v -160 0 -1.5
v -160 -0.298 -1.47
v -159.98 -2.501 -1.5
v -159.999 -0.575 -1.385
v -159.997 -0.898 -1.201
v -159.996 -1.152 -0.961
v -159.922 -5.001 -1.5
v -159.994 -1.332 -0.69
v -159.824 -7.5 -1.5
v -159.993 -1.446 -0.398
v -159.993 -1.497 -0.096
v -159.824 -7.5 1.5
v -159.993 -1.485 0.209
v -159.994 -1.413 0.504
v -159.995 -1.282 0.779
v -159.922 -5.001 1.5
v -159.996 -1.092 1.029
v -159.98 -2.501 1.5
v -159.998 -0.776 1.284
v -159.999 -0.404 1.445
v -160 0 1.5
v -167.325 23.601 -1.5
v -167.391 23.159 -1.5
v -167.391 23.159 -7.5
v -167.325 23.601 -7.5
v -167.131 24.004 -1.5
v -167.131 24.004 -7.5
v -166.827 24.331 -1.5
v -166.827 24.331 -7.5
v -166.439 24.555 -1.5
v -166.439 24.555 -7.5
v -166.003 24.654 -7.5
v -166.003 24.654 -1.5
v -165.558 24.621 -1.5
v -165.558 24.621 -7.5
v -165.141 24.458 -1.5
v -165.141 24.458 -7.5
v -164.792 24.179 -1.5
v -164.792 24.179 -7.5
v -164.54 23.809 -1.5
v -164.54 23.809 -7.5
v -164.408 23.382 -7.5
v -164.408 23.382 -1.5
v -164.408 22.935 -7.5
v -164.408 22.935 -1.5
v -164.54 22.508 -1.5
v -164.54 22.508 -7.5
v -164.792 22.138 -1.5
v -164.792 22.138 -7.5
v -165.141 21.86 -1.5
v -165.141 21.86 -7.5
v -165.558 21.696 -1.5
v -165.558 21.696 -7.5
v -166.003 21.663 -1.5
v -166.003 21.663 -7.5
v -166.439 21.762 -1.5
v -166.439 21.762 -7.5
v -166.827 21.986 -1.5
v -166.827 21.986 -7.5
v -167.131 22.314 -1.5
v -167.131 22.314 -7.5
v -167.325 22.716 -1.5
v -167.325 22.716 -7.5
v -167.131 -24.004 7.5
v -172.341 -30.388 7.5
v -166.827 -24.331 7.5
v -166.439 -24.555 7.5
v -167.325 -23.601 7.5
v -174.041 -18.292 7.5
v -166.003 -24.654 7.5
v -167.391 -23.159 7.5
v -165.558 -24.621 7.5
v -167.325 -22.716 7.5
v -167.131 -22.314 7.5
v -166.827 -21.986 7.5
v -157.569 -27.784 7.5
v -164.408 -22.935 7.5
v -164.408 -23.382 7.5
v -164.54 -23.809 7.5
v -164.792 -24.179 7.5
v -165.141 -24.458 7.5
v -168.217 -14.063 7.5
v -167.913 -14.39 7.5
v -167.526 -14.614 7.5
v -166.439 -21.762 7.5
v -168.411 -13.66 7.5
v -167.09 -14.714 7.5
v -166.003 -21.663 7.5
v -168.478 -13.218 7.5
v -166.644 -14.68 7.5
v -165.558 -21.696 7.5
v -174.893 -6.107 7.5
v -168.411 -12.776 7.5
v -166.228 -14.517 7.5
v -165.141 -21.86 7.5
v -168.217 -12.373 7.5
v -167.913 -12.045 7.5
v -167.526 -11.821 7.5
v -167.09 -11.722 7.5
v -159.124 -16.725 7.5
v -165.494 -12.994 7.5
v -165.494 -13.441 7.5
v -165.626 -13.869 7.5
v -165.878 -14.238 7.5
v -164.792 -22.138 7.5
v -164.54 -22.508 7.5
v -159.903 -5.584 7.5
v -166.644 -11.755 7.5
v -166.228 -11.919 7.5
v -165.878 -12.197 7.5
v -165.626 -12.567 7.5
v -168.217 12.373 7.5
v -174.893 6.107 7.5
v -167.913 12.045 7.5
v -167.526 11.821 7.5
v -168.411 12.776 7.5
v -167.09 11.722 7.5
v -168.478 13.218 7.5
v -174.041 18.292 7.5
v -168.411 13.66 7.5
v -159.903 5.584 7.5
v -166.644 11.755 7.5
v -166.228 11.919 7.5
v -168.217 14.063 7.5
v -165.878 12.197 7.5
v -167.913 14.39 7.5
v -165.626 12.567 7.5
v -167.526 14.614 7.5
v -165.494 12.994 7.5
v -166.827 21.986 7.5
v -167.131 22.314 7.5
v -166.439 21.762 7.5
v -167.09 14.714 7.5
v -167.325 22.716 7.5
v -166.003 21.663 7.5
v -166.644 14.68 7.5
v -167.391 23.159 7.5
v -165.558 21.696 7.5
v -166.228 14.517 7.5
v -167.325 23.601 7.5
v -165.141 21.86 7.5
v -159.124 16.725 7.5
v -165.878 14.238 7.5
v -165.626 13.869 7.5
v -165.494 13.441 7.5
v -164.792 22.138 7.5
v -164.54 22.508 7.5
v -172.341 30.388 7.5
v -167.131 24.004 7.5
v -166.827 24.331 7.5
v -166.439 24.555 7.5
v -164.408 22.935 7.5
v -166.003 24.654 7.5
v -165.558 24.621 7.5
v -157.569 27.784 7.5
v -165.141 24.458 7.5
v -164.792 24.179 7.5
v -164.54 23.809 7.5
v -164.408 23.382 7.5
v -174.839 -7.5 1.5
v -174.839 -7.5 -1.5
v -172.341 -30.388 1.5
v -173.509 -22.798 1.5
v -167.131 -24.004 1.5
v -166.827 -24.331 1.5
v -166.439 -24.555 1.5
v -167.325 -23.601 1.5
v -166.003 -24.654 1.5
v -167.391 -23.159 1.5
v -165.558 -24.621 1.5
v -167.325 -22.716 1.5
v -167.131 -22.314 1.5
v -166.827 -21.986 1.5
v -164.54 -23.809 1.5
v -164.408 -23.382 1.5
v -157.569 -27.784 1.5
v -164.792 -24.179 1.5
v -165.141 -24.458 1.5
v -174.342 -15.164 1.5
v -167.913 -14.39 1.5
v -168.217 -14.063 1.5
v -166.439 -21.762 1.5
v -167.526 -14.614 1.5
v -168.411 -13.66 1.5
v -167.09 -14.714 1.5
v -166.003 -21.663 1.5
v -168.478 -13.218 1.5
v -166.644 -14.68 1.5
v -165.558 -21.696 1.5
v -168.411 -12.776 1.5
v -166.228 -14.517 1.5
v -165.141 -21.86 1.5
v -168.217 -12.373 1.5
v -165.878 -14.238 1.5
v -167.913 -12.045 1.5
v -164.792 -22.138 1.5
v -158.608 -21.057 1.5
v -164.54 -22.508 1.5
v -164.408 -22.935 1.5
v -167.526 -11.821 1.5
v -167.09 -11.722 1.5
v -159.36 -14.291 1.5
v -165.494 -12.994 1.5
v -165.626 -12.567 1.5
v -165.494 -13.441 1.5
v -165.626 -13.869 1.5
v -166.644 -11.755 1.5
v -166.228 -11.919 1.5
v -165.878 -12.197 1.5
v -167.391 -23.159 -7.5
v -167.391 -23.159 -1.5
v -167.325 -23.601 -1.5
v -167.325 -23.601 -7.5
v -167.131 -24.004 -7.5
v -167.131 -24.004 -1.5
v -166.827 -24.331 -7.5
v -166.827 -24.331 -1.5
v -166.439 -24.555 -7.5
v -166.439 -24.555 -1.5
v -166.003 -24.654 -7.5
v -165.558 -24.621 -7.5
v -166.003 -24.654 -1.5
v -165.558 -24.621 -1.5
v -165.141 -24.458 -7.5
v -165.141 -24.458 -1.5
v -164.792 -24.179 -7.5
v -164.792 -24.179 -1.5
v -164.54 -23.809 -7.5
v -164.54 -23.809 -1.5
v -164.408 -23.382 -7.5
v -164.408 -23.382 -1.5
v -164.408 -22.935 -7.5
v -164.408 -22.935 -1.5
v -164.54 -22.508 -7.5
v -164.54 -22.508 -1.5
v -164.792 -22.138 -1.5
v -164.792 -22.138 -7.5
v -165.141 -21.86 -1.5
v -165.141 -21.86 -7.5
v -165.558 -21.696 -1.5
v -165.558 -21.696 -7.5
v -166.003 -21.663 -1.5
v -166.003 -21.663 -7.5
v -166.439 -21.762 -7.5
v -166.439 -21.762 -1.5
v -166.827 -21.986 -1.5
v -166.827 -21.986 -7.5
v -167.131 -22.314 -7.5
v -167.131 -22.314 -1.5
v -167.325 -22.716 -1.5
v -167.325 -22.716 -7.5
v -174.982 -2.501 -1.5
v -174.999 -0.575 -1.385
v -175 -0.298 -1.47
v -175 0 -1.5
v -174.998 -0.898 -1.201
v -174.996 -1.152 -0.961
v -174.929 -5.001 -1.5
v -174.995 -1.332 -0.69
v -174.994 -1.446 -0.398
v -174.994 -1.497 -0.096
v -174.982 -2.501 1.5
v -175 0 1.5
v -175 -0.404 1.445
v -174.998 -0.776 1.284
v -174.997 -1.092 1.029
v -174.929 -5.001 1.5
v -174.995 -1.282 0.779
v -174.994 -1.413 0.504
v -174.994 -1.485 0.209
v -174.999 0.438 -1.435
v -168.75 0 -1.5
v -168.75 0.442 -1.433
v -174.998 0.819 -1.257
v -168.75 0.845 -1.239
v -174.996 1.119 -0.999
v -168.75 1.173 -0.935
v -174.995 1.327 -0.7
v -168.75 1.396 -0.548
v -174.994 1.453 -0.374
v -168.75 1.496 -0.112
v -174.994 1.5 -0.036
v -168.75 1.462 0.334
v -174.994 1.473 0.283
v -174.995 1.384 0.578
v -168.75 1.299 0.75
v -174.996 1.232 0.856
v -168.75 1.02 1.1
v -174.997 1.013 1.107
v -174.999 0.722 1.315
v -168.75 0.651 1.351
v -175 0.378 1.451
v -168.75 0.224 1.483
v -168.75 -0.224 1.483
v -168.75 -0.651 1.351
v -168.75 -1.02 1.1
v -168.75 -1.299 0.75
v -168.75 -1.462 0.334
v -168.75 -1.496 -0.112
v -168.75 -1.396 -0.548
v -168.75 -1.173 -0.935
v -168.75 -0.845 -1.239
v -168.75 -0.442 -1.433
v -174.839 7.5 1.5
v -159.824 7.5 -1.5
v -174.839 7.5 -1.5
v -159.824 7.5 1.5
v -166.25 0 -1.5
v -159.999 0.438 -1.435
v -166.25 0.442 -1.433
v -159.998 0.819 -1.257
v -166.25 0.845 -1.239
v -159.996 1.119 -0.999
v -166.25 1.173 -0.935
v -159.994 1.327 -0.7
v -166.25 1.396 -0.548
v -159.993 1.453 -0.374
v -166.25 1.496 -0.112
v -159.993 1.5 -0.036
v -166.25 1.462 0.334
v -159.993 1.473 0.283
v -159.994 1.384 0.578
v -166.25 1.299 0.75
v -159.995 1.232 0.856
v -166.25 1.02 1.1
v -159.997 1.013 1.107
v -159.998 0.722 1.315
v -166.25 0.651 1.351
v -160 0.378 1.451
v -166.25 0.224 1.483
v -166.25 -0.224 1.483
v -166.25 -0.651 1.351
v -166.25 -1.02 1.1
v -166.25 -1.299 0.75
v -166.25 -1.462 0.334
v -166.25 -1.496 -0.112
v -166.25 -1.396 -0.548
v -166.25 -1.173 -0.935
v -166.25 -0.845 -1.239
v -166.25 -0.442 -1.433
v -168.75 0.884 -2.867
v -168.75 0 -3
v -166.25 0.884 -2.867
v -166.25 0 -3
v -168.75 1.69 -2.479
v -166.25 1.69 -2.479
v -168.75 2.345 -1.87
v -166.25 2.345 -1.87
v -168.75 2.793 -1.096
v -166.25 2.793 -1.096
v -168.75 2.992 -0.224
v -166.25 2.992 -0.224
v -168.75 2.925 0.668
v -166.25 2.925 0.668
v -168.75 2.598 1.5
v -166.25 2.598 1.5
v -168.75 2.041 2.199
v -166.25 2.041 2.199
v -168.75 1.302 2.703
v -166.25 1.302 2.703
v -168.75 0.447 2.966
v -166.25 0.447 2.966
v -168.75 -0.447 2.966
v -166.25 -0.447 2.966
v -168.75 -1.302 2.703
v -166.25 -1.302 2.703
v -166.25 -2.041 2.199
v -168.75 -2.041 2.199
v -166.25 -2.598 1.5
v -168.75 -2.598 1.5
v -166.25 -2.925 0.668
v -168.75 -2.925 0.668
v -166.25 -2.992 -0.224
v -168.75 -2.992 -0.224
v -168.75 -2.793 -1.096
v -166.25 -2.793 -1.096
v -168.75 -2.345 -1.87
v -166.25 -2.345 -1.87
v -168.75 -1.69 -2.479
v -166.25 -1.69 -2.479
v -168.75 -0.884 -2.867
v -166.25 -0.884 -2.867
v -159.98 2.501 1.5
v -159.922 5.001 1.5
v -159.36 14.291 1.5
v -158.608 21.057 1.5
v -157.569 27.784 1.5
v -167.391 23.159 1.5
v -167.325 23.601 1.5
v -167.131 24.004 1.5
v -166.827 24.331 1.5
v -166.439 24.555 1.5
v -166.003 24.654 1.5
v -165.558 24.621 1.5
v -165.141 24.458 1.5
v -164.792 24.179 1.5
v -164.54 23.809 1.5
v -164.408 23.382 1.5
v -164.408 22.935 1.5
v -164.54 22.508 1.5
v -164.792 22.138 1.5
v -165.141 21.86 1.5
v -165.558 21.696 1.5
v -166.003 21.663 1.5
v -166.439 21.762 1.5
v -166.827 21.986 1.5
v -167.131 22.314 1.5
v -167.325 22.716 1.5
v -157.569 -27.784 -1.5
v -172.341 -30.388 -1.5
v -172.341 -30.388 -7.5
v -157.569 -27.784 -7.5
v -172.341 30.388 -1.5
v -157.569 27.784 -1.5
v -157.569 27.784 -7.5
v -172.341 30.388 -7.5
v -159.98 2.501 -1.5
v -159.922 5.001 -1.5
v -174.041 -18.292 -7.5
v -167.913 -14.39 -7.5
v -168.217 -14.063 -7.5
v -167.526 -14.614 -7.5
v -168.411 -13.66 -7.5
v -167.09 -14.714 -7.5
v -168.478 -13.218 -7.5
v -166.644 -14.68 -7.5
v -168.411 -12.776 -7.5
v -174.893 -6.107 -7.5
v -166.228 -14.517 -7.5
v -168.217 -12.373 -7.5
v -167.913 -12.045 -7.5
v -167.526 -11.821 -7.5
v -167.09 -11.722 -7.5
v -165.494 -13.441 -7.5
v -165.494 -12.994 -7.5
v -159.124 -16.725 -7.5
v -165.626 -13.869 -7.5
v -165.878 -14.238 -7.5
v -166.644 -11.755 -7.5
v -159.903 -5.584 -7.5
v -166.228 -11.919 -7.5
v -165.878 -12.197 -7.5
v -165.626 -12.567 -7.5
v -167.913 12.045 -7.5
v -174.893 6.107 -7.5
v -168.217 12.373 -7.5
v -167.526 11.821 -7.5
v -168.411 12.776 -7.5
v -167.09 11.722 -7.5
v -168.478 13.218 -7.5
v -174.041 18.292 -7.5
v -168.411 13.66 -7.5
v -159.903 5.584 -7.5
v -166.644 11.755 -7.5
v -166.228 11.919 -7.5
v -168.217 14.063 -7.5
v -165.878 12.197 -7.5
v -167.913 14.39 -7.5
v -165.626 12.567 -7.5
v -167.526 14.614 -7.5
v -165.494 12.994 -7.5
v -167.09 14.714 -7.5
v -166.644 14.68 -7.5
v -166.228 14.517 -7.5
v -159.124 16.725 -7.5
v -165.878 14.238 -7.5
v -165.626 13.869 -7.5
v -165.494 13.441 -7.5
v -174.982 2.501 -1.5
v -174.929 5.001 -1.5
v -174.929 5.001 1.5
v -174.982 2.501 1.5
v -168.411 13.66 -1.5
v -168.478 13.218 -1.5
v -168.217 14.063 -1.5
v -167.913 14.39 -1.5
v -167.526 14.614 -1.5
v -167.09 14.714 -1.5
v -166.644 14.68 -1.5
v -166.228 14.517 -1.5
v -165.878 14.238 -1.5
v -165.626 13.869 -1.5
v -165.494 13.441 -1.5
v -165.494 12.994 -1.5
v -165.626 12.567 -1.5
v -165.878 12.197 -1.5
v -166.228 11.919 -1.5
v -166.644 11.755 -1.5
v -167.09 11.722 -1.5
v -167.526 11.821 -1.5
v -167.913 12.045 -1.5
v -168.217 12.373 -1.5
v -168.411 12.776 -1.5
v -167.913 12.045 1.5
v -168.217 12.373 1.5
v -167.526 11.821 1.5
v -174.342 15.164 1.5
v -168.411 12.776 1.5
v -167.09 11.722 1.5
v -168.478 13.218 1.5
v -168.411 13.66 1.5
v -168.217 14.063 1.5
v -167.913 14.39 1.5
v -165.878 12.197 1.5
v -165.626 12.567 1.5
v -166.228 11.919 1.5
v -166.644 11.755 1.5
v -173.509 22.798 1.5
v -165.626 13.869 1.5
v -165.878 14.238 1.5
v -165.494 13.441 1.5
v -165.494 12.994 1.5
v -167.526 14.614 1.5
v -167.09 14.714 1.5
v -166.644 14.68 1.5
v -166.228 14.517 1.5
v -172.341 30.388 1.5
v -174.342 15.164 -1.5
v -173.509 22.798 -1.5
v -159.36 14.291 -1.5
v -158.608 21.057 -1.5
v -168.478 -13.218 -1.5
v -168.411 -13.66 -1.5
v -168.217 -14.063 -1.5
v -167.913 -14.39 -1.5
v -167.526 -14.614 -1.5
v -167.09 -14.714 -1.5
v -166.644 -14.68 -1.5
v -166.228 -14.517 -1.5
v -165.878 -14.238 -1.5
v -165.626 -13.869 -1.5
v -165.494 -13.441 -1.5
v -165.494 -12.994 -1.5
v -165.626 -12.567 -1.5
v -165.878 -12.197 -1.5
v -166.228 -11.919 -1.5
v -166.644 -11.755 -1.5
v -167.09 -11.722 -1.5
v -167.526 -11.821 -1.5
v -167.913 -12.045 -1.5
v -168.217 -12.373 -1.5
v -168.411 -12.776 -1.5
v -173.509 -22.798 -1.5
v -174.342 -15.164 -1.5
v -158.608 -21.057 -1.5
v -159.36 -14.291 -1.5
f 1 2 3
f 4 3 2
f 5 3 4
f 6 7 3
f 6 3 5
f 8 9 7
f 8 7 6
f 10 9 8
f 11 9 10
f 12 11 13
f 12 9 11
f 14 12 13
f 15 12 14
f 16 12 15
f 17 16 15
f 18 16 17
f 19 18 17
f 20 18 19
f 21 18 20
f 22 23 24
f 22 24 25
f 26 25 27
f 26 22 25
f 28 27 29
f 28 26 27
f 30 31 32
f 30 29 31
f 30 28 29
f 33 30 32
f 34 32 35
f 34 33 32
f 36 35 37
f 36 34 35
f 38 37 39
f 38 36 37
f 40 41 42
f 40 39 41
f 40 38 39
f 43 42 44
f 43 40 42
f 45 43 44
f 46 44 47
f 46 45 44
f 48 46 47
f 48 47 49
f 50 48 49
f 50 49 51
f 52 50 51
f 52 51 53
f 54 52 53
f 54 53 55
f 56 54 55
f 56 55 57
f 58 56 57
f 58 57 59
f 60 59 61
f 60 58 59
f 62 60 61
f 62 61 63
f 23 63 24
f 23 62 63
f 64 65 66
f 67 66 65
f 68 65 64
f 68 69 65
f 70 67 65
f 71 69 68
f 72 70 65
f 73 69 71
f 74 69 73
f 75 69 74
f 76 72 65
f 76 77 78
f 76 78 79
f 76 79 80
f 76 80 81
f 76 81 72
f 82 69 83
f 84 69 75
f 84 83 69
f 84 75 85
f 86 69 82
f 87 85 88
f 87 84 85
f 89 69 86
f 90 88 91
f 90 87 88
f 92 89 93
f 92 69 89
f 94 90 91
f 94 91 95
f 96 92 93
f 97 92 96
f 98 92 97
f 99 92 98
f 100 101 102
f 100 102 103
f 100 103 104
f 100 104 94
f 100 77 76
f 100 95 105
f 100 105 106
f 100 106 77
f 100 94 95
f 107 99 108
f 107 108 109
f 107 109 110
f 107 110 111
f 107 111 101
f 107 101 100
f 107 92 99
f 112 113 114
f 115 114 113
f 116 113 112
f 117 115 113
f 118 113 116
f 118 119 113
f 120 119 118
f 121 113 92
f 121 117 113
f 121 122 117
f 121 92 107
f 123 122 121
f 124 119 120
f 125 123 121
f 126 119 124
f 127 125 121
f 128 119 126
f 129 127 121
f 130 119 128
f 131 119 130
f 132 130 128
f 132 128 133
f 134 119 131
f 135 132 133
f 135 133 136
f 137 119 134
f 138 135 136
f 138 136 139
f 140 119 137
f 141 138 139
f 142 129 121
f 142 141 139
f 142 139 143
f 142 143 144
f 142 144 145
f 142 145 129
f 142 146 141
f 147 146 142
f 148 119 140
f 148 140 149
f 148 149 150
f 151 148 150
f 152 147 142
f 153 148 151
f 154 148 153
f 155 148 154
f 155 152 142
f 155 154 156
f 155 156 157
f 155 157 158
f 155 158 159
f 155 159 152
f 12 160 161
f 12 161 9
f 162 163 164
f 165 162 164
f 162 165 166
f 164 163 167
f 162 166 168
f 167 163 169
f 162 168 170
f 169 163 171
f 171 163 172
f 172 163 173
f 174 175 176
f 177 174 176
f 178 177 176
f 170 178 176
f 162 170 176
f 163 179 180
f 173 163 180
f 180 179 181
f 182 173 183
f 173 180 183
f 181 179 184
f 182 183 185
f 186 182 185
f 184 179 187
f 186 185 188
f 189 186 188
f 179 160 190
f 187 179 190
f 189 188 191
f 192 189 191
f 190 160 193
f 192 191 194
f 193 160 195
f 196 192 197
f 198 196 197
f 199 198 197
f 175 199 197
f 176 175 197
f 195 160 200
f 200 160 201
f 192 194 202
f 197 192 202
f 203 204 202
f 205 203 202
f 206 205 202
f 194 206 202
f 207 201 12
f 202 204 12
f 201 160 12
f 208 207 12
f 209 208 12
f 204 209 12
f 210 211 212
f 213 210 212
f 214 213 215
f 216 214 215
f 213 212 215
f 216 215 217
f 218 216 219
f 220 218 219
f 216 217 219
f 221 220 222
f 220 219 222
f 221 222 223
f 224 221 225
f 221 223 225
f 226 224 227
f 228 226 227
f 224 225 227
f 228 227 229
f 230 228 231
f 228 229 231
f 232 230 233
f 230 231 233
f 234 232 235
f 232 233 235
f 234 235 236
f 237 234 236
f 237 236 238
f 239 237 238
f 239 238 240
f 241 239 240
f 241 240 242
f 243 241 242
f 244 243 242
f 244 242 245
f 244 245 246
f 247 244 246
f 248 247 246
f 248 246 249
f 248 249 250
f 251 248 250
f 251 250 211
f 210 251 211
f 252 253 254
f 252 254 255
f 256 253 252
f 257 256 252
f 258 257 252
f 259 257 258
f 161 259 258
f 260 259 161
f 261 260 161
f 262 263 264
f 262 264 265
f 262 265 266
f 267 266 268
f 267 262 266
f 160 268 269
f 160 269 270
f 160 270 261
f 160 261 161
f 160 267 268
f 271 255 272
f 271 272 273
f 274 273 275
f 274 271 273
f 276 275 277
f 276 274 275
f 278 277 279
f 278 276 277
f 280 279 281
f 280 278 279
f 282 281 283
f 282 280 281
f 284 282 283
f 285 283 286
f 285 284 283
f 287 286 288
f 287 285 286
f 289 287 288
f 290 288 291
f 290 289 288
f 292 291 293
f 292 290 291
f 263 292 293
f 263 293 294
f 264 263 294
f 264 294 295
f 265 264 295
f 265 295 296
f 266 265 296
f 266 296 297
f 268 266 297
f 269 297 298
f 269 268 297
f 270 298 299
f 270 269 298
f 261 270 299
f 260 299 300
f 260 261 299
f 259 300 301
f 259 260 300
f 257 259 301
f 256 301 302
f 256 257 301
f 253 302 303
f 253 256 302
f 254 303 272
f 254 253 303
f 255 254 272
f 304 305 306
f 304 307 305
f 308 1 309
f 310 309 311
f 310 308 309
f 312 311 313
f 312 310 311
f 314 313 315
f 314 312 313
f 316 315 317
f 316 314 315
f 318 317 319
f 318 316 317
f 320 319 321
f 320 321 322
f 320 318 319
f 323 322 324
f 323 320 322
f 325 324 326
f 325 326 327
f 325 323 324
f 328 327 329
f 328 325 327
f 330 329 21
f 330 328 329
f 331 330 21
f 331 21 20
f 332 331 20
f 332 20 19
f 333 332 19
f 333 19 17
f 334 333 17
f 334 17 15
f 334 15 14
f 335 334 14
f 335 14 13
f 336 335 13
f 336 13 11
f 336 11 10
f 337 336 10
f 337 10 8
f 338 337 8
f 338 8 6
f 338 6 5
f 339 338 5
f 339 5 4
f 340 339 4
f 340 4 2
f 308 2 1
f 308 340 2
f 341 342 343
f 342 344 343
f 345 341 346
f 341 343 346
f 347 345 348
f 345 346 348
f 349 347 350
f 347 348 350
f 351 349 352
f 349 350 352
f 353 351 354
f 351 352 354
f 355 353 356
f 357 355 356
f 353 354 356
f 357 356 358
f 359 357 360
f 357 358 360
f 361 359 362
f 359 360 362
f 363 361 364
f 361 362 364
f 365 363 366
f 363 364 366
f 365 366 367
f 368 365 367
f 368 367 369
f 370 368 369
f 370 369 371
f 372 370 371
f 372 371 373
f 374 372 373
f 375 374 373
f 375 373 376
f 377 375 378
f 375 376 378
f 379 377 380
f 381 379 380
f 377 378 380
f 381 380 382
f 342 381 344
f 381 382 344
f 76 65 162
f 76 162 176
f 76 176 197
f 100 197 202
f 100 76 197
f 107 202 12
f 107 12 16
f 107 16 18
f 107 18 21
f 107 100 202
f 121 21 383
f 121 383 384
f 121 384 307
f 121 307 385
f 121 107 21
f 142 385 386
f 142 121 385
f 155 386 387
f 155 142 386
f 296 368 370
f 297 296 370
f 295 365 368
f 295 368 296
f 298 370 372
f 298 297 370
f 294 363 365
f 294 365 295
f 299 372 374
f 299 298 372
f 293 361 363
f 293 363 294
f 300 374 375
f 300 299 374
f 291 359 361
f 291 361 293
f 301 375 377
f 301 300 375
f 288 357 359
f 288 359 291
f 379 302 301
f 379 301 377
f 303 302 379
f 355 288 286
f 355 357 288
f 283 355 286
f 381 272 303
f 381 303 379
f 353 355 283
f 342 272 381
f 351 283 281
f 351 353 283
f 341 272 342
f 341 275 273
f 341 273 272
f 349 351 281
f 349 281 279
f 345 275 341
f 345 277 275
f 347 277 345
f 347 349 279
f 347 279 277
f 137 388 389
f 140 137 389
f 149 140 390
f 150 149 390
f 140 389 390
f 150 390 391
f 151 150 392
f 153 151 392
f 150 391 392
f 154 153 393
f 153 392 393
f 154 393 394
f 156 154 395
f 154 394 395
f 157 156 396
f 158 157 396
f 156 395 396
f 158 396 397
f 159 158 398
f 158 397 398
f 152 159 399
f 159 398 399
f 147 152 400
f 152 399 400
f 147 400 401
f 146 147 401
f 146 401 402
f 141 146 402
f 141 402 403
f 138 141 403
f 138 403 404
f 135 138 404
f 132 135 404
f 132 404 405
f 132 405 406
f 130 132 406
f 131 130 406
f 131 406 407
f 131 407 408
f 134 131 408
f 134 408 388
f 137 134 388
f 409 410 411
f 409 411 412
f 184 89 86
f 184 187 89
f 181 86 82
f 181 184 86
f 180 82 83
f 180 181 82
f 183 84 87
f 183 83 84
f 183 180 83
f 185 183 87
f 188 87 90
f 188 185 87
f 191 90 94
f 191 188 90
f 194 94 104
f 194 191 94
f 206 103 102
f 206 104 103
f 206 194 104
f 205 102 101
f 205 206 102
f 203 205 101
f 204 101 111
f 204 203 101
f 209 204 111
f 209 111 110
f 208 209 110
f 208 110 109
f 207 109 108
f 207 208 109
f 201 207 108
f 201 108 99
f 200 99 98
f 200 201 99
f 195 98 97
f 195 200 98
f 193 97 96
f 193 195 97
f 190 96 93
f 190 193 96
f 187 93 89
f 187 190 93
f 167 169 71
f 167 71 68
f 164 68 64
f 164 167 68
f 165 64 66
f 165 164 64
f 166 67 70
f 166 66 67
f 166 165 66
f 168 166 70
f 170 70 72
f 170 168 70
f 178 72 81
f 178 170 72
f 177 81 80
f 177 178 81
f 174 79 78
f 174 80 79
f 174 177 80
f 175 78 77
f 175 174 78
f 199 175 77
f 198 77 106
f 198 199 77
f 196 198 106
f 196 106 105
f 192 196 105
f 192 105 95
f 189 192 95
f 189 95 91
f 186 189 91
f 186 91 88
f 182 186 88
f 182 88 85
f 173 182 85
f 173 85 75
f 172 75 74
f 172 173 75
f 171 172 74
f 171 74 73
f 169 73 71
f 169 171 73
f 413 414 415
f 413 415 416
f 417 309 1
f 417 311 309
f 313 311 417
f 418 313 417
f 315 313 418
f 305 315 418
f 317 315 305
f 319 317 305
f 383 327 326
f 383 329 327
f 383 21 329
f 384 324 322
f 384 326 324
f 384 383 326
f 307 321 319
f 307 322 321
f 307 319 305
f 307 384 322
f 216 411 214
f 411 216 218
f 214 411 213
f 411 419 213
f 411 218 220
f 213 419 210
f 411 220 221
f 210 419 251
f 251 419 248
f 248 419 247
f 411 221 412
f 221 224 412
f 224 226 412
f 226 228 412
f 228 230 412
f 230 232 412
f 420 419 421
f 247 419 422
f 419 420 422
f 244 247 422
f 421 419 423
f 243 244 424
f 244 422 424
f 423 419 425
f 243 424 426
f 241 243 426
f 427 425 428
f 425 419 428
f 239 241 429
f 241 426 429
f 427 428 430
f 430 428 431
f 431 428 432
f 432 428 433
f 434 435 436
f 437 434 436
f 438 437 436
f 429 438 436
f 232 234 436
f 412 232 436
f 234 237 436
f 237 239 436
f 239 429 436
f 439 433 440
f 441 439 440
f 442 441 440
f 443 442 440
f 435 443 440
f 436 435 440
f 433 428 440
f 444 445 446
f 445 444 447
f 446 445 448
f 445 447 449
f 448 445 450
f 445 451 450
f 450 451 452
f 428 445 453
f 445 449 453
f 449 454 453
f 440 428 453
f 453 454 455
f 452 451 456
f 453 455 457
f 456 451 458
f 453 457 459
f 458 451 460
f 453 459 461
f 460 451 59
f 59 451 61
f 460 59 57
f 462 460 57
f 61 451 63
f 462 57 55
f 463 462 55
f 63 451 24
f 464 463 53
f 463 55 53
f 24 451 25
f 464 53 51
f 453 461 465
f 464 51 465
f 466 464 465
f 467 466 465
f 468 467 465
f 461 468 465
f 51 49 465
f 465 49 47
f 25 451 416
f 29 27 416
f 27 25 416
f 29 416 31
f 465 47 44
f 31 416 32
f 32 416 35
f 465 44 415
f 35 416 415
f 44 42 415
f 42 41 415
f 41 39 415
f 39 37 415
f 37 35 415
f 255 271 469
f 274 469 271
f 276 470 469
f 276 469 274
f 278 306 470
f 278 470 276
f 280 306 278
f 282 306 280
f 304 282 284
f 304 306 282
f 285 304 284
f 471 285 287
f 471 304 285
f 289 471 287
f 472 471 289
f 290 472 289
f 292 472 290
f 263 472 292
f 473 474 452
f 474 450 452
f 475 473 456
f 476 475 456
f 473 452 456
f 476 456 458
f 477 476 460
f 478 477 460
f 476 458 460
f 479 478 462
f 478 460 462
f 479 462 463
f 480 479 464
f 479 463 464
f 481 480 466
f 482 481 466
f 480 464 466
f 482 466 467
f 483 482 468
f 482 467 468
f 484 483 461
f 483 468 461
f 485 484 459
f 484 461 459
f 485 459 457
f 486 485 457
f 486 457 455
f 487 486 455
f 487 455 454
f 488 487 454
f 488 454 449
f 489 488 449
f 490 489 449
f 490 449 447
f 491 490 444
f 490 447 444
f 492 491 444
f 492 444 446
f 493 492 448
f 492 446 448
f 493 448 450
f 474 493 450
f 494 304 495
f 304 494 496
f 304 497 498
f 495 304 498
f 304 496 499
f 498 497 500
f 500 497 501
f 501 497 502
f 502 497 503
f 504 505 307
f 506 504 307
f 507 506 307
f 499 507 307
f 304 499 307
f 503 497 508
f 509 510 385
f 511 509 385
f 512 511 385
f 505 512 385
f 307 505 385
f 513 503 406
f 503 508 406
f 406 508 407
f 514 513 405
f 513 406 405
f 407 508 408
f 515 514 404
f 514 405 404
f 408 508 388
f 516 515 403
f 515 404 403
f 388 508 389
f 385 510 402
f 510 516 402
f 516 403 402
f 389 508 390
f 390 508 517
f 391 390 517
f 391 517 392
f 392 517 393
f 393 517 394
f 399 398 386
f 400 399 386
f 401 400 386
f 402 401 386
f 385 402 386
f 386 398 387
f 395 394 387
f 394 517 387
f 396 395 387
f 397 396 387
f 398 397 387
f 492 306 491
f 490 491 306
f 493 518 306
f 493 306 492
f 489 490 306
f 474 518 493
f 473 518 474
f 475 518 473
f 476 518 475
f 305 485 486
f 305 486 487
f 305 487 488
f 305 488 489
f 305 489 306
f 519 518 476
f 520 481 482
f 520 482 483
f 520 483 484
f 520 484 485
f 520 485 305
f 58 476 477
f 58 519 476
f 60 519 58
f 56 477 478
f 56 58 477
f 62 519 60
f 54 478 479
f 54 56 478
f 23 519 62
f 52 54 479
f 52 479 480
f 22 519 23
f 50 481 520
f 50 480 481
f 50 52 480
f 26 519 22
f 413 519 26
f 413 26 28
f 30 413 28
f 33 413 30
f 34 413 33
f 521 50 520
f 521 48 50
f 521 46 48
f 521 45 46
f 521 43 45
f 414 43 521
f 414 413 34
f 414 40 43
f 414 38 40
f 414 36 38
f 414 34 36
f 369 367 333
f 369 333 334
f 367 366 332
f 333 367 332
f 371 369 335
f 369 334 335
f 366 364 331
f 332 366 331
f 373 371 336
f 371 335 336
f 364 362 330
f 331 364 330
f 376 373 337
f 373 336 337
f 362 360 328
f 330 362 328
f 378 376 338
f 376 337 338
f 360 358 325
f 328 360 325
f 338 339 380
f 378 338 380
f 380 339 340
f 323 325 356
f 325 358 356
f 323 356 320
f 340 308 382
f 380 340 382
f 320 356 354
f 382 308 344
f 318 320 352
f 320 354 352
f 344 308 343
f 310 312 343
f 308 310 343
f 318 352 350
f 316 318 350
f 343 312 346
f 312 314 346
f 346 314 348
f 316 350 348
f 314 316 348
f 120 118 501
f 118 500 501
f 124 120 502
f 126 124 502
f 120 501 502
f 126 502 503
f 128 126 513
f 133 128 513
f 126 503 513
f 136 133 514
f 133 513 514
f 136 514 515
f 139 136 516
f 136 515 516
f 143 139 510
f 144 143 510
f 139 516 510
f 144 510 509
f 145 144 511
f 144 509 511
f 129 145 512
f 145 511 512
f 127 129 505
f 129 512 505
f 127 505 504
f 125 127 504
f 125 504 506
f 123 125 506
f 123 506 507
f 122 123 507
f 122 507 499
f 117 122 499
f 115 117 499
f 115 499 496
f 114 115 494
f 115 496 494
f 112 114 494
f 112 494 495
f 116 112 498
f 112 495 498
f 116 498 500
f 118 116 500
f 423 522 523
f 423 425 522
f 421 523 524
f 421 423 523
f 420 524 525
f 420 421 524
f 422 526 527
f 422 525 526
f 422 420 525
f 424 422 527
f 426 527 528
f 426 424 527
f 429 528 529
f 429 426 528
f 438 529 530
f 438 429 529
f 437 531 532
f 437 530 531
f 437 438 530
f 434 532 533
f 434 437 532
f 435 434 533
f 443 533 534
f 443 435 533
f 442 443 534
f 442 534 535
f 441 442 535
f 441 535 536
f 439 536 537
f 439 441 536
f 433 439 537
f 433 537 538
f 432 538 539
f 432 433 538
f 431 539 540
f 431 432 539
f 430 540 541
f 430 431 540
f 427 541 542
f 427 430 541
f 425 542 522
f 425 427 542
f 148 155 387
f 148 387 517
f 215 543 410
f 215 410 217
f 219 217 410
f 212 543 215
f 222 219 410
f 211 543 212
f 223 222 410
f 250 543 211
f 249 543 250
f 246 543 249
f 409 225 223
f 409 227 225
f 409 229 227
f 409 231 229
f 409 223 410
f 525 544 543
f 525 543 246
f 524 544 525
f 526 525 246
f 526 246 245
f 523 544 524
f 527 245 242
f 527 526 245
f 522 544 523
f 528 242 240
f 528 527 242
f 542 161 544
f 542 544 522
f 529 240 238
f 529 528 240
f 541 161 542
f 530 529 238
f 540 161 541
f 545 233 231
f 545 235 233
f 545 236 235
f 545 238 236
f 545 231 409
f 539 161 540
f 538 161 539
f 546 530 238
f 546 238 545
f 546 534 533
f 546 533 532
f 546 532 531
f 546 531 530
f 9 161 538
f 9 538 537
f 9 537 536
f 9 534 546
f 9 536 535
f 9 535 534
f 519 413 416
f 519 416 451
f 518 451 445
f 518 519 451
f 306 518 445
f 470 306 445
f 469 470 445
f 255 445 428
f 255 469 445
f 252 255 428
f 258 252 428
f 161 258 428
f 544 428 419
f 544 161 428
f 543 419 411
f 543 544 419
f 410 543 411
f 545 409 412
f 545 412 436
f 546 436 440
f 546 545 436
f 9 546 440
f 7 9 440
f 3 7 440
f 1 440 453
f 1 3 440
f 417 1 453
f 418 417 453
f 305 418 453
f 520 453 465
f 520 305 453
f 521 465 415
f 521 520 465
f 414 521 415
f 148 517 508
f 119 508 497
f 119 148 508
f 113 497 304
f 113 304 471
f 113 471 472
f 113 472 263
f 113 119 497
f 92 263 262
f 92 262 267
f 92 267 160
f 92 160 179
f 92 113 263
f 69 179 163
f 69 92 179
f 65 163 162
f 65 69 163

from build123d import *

# Parameters (mm, degrees)
BOSS_EXTRUDE3_DEPTH   = 7.5
CUT_EXTRUDE4_DEPTH    = 1.5
BOSS_EXTRUDE5_DEPTH   = 1.5
SKETCH4_R             = 3
BEARING_HOLE_DEPTH    = 1.25
SHAFT_HOLE_DEPTH      = 33.837885572
SHAFT_HOLE_DEPTH_BACK = 33.837885572
SKETCH7_R             = 1.5
SKETCH3_R             = 1.5
MOUNT_HOLE_DEPTH      = 178.777126728


with BuildPart() as part:
    # Sketch1 → Boss-Extrude3 (new, symmetric)
    with BuildSketch(Plane.XY):
        with BuildLine():
            ThreePointArc((-157.569240482, -27.783708427), (-160, 0), (-157.569240482, 27.783708427))
            Line((-157.569240482, 27.783708427), (-172.341356777, 30.388431092))
            ThreePointArc((-172.341356777, 30.388431092), (-175, 0), (-172.341356777, -30.388431092))
            Line((-172.341356777, -30.388431092), (-157.569240482, -27.783708427))
        make_face()
    extrude(amount=BOSS_EXTRUDE3_DEPTH, both=True)

    # Sketch1<6> → Cut-Extrude4 (cut, symmetric)
    with BuildSketch(Plane.XY):
        with BuildLine():
            Line((-157.569240482, 27.783708427), (-172.341356777, 30.388431092))
            ThreePointArc((-172.341356777, 30.388431092), (-175, 0), (-172.341356777, -30.388431092))
            Line((-172.341356777, -30.388431092), (-157.569240482, -27.783708427))
            ThreePointArc((-157.569240482, -27.783708427), (-160, 0), (-157.569240482, 27.783708427))
        make_face()
    extrude(amount=CUT_EXTRUDE4_DEPTH, both=True, mode=Mode.SUBTRACT)


with BuildPart() as cut_extrude4_piece_1:
    # of the separate pieces the step leaves, piece 1, a body of its own (cut_extrude4_pieces)
    add(part.part.solids().sort_by_distance((-157.569240482, -27.783708427, -1.5))[0])



with BuildPart() as cut_extrude4_piece_2:
    # of the separate pieces the step leaves, piece 2, a body of its own (cut_extrude4_pieces)
    add(part.part.solids().sort_by_distance((-157.569240482, -27.783708427, 7.5))[0])


with BuildPart() as cut_extrude4_piece_1_1:
    add(cut_extrude4_piece_1.part)

    add(cut_extrude4_piece_2.part)  # Boss-Extrude5 merges Cut-Extrude4 piece 2
    # Sketch6 → Boss-Extrude5 (add, symmetric)
    with BuildSketch(Plane.XY):
        with BuildLine():
            Line((-159.824122084, 7.5), (-174.839211849, 7.5))
            ThreePointArc((-174.839211849, 7.5), (-175, 0), (-174.839211849, -7.5))
            Line((-174.839211849, -7.5), (-159.824122084, -7.5))
            ThreePointArc((-159.824122084, -7.5), (-160, 0), (-159.824122084, 7.5))
        make_face()
    extrude(amount=BOSS_EXTRUDE5_DEPTH, both=True)

    # Sketch4 → bearing hole (cut, symmetric)
    with BuildSketch(Plane(origin=(-167.5, 0, 0), x_dir=(0, 0, -1), z_dir=(1, 0, 0))):
        Circle(SKETCH4_R)
    extrude(amount=BEARING_HOLE_DEPTH, both=True, mode=Mode.SUBTRACT)

    # Sketch7 → shaft hole (cut, two sides: drawn at the far end of the back side and taken through both)
    with BuildSketch(Plane(origin=(-167.5, 0, 0), x_dir=(0, 0, -1), z_dir=(1, 0, 0)).offset(-SHAFT_HOLE_DEPTH_BACK)):
        Circle(SKETCH7_R)
    extrude(amount=SHAFT_HOLE_DEPTH + SHAFT_HOLE_DEPTH_BACK, mode=Mode.SUBTRACT)

    # Sketch3 → mount hole (cut, symmetric)
    with BuildSketch(Plane(origin=(0, 0, 0), x_dir=(-1, 0, 0), z_dir=(0, 0, -1))):
        with Locations((165.891323638, 23.158556552)):
            Circle(SKETCH3_R)
        with Locations((166.977667312, 13.217738807)):
            Circle(SKETCH3_R)
    mount_hole = extrude(amount=MOUNT_HOLE_DEPTH, both=True, mode=Mode.SUBTRACT)

    # Mirror1: mount hole across plane
    add(mount_hole.mirror(Plane.ZX), mode=Mode.SUBTRACT)


solid = cut_extrude4_piece_1_1.part
